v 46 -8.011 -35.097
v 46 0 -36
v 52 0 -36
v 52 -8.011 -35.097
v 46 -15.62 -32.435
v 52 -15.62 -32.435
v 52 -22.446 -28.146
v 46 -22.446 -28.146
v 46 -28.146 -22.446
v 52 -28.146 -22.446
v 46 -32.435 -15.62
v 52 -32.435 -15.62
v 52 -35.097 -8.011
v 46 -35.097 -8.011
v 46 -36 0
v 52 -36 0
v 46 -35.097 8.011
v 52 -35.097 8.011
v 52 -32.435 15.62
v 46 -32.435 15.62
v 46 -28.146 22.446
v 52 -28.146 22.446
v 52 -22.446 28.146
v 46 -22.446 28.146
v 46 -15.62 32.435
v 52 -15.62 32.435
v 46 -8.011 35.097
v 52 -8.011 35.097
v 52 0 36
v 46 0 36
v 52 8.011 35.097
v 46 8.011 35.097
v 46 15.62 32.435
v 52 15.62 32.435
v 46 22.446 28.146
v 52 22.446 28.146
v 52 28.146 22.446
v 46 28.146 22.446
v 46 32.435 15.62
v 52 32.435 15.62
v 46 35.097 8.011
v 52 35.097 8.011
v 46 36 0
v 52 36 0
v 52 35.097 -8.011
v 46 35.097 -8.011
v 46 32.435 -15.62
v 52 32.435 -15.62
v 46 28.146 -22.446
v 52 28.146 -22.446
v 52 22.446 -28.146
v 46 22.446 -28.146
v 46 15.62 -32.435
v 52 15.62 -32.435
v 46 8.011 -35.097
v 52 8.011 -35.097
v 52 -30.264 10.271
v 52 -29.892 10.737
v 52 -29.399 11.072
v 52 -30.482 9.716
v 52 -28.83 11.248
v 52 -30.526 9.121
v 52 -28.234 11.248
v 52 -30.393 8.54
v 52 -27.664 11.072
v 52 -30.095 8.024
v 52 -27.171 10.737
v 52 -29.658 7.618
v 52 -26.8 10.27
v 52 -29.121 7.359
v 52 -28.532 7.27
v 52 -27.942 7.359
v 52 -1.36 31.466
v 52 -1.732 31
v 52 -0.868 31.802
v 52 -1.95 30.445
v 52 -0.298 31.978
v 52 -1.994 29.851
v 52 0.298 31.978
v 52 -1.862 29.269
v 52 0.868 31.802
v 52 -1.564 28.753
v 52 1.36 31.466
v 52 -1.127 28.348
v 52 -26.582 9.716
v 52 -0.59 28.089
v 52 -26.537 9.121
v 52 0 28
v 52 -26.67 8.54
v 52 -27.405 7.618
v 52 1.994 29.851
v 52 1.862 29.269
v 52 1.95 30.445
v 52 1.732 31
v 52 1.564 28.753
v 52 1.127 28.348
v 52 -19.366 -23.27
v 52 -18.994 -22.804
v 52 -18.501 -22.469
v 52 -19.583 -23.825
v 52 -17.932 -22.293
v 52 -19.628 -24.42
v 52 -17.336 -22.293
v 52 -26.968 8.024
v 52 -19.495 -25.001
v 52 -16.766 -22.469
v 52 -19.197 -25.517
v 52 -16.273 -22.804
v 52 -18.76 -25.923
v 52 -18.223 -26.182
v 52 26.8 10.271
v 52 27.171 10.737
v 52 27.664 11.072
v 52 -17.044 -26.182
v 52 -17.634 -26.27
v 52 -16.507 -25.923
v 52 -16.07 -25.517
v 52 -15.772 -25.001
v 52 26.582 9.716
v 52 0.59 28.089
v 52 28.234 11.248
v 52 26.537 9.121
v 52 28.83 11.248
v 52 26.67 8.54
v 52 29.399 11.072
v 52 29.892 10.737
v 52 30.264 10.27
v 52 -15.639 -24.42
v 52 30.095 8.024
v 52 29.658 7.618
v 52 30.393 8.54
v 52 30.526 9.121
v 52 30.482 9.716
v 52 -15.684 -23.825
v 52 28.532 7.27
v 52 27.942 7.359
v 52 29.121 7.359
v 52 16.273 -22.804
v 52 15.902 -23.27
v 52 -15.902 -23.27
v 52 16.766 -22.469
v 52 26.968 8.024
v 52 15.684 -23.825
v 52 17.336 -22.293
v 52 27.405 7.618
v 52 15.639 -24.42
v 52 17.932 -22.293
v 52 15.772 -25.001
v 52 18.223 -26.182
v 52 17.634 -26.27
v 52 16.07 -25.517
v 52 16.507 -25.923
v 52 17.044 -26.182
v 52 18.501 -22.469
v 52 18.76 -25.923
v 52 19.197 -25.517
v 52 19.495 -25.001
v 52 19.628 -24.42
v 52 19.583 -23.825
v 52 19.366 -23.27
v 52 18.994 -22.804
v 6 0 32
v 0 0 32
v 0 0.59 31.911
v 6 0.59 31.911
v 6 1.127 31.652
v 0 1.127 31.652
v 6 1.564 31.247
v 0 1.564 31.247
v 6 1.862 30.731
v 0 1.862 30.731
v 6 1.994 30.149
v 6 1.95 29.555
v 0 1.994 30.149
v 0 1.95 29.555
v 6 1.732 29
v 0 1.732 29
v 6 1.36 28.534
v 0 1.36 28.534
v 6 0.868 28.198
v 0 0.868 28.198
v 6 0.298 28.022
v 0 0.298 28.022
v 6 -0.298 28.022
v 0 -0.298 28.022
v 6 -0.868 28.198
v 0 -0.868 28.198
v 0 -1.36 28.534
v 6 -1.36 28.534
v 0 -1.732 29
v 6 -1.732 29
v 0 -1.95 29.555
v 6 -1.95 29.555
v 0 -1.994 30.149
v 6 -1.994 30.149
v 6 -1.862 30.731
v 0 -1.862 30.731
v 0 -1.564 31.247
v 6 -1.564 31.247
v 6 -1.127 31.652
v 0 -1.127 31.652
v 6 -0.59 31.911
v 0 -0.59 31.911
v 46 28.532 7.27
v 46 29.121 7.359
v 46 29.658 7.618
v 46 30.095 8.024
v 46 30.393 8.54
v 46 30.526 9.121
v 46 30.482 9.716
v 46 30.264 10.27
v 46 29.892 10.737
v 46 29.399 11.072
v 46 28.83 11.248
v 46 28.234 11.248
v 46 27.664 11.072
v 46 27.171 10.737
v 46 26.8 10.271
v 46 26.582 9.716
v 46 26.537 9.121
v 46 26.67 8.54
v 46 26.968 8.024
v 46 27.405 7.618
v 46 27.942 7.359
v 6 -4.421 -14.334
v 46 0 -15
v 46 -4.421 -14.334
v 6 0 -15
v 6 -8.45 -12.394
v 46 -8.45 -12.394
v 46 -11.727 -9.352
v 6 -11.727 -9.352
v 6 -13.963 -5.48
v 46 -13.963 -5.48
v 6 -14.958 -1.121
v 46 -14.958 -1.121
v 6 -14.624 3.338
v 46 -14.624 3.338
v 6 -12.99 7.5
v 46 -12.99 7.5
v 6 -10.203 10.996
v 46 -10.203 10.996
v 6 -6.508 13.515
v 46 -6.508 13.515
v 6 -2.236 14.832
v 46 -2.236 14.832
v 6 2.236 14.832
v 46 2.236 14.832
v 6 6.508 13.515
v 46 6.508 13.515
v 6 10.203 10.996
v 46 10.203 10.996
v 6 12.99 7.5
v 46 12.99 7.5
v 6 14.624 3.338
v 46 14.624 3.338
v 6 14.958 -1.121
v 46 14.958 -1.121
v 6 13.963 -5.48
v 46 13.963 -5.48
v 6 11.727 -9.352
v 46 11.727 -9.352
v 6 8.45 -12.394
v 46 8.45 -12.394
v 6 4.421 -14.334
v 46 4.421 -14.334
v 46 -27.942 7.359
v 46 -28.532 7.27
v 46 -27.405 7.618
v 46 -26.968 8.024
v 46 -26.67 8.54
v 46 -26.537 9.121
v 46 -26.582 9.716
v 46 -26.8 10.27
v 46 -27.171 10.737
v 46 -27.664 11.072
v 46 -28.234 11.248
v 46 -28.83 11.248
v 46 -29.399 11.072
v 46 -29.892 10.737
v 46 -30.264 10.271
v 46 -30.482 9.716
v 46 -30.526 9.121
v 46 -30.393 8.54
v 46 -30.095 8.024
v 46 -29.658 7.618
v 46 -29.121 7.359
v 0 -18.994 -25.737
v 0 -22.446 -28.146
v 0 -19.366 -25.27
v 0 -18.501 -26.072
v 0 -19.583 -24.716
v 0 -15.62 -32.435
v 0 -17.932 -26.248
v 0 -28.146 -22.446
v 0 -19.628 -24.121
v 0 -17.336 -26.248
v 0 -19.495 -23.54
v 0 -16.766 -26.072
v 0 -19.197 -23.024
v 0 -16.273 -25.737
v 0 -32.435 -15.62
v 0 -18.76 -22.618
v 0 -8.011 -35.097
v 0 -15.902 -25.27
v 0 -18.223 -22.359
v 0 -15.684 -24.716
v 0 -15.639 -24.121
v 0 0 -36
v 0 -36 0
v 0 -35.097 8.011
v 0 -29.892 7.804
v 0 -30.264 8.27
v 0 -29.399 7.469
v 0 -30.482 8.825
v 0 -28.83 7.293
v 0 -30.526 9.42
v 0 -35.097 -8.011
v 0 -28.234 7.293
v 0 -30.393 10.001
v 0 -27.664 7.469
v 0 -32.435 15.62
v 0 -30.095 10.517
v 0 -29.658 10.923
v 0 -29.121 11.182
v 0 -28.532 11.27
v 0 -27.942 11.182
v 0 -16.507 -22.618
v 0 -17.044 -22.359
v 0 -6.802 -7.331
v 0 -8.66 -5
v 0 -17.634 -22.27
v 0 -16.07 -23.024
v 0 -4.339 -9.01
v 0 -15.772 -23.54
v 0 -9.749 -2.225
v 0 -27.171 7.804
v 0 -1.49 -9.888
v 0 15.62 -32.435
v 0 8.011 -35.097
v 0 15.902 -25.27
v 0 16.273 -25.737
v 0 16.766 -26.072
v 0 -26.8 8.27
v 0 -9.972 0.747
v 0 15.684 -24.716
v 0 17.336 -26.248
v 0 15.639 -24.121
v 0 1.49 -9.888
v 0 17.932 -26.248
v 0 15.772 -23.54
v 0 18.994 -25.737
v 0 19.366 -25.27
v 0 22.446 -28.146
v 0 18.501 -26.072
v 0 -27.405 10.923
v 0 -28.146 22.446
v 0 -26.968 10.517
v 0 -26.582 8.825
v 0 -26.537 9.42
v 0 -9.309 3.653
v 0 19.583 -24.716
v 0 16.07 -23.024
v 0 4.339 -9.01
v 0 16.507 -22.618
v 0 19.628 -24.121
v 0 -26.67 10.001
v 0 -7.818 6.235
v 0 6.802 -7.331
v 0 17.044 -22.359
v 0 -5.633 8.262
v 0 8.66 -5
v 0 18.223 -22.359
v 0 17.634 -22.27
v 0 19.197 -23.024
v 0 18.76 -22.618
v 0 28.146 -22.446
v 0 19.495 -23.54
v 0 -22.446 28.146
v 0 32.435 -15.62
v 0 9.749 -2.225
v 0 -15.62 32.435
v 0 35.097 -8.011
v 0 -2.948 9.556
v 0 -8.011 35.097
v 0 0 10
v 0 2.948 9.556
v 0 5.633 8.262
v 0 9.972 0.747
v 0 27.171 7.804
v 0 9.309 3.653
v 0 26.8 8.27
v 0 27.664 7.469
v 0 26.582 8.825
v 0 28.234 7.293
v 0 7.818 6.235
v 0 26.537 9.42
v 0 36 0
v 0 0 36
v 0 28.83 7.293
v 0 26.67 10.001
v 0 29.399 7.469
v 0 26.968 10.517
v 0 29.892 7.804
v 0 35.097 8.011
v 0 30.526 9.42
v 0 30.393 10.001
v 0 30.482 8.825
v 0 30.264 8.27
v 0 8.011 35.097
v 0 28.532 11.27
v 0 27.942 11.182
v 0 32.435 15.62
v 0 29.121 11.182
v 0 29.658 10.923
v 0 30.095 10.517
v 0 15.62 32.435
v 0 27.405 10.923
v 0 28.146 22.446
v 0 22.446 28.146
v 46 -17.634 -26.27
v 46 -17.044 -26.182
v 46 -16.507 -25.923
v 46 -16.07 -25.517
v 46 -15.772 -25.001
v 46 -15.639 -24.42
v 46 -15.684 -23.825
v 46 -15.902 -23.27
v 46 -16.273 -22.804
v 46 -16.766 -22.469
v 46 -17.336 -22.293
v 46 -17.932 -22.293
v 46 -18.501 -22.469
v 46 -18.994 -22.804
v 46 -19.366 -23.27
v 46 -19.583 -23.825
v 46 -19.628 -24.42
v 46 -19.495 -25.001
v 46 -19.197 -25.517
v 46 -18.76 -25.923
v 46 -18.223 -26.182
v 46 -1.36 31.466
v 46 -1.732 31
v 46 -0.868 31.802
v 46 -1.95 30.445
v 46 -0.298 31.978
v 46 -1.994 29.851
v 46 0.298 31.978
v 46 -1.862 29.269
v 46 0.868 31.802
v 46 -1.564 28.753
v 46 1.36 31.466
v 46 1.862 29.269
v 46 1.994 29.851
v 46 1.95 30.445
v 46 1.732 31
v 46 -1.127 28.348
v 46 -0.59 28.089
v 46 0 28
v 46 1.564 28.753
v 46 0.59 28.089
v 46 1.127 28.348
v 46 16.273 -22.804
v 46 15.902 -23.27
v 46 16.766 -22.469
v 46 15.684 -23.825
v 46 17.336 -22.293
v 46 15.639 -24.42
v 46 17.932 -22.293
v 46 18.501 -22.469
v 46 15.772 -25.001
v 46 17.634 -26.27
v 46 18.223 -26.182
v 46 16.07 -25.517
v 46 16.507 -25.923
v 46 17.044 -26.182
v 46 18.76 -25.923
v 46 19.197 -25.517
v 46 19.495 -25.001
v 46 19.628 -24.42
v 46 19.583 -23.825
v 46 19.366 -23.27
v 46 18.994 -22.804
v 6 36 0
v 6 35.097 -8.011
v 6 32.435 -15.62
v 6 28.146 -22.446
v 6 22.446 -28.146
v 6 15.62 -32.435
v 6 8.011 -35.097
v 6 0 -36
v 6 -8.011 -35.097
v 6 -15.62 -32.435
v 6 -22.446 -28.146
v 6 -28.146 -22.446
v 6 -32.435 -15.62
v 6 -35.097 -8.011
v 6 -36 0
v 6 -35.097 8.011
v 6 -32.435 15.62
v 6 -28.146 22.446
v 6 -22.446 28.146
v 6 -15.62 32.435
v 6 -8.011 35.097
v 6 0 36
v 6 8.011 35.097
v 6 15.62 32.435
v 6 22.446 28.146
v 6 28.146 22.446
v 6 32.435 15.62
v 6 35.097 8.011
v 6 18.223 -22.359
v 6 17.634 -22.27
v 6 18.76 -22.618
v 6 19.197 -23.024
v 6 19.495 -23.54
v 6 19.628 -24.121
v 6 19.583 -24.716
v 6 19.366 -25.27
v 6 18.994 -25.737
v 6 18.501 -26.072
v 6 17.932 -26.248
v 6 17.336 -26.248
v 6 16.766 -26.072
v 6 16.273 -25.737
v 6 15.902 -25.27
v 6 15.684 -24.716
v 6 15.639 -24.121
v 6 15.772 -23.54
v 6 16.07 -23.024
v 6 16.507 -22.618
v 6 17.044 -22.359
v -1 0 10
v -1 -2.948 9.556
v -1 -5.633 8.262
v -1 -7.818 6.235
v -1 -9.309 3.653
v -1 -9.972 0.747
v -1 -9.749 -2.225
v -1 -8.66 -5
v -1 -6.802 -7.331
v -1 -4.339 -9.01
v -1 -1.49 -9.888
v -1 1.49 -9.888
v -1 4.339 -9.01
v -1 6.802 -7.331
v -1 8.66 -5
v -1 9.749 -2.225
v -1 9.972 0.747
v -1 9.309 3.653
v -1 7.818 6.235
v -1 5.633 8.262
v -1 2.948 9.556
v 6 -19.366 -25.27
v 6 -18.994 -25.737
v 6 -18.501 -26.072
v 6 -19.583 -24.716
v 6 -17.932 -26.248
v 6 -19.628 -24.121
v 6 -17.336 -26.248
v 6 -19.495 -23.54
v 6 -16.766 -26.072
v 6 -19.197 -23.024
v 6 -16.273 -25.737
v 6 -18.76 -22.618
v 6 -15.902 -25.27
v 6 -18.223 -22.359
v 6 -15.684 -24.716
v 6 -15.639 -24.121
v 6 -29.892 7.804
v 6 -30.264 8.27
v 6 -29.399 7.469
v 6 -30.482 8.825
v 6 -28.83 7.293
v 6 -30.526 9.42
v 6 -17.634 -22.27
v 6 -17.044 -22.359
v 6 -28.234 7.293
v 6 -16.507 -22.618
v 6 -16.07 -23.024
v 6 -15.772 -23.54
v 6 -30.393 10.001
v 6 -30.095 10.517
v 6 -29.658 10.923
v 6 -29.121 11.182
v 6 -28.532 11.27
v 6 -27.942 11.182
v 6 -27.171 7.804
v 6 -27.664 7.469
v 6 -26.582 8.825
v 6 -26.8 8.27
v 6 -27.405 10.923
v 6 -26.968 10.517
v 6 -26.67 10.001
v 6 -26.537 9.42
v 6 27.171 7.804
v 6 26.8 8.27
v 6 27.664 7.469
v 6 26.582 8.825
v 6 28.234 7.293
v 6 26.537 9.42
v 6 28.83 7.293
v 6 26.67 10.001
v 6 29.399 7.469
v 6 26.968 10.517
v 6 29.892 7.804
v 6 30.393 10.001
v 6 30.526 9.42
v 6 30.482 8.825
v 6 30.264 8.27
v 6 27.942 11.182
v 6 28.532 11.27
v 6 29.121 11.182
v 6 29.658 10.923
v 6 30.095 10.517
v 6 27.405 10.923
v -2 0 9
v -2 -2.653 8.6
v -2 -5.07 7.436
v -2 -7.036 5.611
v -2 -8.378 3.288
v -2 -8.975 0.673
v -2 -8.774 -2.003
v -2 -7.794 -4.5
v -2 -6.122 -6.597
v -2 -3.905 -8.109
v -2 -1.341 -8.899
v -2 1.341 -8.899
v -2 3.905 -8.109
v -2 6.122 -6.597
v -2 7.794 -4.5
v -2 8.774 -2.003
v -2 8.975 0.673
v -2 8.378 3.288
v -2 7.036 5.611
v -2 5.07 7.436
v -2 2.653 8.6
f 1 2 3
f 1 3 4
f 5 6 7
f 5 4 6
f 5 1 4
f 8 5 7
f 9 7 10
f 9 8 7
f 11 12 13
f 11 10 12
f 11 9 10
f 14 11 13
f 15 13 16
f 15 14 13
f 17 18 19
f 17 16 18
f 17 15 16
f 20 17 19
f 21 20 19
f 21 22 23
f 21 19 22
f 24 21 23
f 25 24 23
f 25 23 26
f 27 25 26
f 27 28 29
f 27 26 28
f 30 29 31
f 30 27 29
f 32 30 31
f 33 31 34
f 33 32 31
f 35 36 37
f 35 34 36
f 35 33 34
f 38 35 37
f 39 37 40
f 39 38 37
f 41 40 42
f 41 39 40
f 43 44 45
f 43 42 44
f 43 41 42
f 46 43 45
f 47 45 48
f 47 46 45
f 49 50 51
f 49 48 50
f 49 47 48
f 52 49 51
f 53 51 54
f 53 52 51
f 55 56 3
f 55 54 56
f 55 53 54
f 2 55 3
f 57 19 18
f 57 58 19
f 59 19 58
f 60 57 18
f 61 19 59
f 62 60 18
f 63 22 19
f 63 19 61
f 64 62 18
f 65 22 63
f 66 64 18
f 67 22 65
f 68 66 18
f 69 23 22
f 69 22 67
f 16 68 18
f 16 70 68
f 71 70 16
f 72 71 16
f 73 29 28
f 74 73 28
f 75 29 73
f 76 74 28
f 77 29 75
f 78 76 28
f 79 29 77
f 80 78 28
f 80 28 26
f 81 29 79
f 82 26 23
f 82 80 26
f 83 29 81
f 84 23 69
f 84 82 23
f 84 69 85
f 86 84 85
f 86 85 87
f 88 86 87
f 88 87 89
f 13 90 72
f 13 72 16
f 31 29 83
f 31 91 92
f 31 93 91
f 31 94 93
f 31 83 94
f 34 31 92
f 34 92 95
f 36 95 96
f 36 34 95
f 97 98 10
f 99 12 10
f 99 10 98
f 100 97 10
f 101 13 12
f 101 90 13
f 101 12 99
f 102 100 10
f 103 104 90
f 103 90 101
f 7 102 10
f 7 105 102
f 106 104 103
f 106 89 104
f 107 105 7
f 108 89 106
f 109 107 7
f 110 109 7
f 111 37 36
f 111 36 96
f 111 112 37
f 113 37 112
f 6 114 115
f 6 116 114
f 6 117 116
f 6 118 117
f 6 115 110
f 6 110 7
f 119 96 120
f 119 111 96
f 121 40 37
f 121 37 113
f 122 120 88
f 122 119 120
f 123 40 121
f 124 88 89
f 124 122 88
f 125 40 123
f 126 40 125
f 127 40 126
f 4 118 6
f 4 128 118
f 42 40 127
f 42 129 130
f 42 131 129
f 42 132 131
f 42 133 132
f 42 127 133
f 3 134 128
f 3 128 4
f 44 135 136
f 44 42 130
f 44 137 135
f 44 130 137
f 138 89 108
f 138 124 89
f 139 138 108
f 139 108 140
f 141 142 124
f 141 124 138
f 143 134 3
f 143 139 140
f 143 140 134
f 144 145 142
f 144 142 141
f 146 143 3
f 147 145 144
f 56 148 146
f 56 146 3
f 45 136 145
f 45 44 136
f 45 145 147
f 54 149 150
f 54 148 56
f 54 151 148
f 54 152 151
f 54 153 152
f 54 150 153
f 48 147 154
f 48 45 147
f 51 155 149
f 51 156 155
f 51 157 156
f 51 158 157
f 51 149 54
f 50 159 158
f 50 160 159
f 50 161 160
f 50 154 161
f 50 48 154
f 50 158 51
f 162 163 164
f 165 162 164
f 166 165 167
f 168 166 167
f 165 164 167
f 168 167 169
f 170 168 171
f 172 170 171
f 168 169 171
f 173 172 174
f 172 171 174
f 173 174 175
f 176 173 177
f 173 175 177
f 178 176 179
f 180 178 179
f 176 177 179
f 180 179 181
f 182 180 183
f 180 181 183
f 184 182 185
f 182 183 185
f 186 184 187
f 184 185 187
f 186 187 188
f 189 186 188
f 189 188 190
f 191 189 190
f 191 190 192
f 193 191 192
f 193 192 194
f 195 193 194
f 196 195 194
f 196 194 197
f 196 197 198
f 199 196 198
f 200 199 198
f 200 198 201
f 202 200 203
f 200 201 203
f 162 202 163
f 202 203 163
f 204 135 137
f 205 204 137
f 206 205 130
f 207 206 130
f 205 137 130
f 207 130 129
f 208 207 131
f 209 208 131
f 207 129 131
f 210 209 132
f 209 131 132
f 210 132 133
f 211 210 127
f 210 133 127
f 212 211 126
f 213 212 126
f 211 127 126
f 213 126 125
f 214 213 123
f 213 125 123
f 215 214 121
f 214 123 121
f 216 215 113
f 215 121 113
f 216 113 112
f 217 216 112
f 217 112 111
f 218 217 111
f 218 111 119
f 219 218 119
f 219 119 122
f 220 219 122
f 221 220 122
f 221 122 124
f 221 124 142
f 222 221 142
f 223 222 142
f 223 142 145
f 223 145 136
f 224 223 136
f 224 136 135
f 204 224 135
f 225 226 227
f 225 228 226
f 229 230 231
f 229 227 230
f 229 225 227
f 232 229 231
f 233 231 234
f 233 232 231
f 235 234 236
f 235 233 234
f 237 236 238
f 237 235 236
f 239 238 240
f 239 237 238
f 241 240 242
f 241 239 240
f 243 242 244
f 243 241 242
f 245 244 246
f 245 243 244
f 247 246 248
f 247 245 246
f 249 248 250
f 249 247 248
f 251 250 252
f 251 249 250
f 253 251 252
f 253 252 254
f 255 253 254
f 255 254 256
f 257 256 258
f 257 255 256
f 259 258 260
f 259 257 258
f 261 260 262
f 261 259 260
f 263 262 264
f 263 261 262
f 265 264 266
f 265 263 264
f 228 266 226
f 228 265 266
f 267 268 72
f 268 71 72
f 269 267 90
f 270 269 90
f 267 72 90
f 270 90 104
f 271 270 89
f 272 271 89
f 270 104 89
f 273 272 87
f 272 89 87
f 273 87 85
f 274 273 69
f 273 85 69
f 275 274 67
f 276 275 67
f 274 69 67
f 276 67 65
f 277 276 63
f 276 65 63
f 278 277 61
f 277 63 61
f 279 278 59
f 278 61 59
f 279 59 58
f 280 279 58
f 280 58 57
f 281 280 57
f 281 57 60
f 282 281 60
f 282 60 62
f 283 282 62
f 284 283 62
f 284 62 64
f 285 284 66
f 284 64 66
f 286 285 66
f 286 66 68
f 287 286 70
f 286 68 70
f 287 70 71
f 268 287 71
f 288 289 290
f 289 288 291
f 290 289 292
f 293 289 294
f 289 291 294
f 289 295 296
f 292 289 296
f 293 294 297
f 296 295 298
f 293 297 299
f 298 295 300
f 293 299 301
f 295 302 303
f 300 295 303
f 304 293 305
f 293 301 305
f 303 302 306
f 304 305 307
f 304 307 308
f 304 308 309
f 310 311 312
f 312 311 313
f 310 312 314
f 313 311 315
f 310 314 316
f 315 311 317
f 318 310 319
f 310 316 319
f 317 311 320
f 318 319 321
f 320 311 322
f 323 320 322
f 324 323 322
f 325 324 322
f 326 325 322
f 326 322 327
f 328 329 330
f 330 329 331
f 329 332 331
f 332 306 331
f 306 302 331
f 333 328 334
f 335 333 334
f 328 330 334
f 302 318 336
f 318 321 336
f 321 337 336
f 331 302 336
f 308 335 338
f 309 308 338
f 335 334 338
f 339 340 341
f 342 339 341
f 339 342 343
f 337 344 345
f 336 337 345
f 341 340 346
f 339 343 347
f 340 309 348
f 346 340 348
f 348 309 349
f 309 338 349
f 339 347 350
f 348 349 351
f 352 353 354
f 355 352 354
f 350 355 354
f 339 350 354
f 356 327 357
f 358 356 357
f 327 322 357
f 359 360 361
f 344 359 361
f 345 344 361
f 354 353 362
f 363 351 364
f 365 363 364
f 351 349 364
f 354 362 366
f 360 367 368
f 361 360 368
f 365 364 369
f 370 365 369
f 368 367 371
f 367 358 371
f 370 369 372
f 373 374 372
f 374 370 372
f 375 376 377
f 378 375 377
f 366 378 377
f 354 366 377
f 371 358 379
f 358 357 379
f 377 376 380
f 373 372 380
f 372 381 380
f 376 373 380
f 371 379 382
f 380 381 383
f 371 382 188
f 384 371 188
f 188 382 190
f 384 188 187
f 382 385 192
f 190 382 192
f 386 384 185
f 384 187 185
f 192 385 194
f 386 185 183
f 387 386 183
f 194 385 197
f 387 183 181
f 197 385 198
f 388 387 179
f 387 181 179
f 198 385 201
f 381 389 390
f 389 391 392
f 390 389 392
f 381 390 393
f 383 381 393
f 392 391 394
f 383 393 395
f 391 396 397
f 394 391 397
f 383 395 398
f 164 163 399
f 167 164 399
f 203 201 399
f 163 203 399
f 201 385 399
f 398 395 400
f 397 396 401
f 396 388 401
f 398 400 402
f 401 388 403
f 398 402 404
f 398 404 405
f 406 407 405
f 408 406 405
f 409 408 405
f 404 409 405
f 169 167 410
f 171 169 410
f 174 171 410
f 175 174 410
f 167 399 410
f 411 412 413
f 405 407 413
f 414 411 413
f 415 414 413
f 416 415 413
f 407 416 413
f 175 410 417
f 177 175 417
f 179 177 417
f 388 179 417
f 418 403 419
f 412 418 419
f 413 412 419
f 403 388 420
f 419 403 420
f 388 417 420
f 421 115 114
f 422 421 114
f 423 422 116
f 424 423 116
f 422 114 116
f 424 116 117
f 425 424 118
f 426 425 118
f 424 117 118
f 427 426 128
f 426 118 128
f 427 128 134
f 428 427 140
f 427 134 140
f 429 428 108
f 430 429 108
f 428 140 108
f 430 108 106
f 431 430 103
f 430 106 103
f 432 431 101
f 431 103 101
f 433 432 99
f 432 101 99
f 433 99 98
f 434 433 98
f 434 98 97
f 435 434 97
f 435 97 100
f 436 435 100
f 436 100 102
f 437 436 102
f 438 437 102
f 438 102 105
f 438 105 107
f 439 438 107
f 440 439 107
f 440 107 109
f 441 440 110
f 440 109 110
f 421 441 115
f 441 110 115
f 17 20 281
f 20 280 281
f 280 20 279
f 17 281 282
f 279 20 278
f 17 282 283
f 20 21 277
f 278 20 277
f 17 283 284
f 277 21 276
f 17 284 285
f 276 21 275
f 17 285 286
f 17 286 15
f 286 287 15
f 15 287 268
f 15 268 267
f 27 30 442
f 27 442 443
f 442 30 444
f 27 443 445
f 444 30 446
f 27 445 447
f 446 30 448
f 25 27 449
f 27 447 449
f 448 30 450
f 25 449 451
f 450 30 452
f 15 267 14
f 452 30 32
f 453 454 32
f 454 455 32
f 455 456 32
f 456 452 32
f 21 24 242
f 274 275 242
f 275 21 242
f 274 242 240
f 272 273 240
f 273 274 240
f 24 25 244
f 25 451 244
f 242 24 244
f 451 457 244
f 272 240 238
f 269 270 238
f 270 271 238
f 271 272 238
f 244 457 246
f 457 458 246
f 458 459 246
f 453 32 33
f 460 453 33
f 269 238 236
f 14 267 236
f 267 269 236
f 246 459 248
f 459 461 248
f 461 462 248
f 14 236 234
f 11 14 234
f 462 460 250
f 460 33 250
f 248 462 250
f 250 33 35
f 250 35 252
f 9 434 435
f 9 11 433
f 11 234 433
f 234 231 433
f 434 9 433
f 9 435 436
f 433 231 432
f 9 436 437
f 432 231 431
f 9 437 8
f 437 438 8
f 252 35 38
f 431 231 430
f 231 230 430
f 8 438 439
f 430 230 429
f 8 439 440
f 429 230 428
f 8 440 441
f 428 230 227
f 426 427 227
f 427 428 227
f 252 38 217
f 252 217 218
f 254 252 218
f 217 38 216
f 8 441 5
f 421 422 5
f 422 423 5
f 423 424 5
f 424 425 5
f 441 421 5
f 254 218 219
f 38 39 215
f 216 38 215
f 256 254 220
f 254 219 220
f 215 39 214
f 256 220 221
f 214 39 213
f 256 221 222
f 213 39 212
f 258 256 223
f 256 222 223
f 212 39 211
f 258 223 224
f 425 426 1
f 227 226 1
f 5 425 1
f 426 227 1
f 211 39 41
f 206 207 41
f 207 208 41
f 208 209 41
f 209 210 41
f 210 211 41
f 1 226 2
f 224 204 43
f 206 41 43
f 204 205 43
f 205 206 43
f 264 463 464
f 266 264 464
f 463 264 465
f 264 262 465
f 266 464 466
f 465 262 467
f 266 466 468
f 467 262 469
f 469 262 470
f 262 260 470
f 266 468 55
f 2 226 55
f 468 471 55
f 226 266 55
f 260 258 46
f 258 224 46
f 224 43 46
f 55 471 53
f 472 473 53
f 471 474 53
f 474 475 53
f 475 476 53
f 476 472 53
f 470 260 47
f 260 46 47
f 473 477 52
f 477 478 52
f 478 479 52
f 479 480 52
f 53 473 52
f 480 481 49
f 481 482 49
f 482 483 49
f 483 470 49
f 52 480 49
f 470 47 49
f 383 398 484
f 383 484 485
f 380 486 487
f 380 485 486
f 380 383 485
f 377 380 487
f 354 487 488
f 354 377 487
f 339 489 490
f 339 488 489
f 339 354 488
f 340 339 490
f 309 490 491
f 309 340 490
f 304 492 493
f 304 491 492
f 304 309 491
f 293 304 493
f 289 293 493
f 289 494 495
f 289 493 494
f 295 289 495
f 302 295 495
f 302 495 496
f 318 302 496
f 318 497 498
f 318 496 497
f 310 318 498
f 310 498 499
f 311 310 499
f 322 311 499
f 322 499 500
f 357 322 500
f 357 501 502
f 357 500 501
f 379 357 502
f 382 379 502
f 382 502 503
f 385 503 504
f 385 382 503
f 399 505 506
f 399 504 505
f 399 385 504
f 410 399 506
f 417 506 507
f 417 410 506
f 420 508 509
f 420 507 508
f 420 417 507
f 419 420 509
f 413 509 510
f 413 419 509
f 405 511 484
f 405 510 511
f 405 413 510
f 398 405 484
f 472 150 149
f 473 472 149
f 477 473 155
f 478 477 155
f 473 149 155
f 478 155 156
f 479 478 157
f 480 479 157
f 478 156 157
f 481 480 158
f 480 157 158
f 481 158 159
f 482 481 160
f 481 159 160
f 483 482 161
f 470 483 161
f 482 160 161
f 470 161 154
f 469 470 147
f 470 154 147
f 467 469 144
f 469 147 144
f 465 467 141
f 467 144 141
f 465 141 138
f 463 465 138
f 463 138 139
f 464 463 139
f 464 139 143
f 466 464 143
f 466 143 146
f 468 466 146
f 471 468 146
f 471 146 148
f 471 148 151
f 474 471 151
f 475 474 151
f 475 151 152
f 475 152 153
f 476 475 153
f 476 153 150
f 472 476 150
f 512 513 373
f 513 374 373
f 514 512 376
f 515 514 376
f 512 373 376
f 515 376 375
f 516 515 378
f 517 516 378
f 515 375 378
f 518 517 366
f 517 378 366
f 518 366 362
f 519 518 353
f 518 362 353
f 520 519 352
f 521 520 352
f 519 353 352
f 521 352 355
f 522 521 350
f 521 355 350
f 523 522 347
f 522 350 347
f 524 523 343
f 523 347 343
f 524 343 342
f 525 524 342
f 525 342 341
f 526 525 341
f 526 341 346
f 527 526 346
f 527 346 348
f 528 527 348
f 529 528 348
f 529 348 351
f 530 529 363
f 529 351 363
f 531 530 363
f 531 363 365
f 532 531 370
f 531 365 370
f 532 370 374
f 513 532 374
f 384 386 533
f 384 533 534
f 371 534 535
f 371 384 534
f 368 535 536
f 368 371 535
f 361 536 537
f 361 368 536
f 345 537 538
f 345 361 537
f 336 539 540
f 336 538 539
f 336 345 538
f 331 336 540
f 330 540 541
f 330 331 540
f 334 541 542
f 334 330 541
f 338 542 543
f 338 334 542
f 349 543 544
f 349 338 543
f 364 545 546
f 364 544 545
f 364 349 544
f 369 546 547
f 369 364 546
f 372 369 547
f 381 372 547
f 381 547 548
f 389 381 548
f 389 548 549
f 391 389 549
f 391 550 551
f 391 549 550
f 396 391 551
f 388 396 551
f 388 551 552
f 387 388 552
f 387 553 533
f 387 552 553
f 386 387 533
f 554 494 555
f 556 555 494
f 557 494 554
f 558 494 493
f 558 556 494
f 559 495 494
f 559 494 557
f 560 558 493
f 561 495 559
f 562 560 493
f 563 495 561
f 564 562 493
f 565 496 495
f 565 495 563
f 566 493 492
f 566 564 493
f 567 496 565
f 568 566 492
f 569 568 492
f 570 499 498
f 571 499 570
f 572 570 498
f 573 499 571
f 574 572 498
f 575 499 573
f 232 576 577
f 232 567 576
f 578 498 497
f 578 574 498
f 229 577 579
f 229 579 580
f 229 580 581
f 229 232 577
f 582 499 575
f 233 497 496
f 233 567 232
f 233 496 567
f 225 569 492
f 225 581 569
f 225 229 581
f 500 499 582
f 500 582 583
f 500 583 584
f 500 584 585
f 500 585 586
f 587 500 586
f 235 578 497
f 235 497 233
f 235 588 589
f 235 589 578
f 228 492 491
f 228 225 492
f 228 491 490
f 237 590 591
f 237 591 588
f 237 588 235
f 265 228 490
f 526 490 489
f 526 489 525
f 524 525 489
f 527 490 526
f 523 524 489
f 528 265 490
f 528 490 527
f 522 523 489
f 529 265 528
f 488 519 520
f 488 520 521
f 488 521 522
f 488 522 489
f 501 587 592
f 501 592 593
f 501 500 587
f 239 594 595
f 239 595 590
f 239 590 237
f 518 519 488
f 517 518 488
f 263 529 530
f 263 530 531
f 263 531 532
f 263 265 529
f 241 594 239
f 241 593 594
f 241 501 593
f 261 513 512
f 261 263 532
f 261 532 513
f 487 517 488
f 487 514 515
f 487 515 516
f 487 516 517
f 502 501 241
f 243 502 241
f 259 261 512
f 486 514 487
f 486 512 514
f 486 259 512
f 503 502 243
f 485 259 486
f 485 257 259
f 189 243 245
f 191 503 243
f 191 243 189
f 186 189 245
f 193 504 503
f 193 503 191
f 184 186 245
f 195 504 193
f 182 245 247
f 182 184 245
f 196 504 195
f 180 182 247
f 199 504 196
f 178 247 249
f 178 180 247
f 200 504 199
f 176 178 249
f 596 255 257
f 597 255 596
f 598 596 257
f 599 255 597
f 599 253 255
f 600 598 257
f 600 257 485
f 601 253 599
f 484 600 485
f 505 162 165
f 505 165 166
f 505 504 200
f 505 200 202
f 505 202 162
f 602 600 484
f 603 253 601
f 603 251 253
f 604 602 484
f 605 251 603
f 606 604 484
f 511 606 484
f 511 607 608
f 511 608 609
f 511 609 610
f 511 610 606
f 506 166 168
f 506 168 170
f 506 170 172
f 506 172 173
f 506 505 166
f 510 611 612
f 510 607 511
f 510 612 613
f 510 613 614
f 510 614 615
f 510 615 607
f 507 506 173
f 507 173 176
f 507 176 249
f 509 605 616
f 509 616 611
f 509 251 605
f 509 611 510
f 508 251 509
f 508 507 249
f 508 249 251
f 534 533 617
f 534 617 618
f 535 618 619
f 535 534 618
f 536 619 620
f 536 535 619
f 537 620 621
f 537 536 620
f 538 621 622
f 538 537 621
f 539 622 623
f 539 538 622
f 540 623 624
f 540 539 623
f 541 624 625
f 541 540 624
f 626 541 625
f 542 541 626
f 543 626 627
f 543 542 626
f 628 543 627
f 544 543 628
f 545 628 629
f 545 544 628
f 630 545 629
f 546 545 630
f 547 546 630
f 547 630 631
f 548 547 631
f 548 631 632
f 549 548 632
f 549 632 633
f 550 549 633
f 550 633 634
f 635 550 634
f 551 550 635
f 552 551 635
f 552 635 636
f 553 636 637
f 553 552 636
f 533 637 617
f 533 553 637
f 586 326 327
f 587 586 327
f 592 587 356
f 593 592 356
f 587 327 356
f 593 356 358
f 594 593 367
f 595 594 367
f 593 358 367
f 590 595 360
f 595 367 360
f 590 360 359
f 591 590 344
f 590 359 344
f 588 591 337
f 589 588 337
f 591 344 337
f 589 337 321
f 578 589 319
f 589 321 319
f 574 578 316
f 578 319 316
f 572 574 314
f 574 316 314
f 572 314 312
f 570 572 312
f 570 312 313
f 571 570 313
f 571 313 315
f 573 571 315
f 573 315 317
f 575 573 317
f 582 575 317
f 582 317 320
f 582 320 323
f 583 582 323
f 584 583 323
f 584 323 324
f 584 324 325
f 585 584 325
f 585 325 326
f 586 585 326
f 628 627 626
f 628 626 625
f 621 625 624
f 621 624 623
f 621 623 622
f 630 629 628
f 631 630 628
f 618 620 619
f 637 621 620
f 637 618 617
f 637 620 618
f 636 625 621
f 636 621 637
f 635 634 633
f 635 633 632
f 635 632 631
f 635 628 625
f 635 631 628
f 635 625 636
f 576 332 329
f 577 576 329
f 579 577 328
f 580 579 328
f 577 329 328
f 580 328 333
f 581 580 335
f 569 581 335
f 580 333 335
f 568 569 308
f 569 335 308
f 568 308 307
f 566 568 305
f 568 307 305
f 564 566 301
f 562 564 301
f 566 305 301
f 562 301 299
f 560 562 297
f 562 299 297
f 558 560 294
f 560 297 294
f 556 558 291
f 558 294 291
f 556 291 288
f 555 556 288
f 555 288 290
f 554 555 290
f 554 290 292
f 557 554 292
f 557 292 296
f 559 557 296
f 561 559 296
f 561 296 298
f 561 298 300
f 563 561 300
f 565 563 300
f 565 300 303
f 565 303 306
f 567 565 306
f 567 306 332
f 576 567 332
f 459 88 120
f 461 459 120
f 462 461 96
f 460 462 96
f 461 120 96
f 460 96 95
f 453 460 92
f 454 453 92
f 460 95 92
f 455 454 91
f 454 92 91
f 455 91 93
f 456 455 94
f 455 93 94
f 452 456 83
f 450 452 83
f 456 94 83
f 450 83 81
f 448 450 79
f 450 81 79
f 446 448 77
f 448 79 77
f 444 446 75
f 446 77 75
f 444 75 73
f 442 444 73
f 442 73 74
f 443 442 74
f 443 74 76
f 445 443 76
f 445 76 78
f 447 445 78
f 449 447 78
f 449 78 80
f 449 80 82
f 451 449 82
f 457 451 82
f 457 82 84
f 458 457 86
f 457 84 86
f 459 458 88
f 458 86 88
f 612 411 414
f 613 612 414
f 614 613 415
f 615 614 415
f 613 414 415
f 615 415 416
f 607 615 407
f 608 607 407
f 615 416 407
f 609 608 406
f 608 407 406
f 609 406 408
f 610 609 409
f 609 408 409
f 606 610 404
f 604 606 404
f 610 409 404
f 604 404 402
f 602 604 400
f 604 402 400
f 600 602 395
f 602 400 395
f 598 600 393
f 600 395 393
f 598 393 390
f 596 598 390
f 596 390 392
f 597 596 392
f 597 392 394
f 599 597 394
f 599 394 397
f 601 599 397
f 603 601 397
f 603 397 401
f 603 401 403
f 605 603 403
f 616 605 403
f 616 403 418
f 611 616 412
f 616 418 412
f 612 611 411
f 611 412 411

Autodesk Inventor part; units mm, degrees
ref_plane "YZ Plane" through (0, 0, 0) normal (1, 0, 0) x (0, 1, 0)
ref_plane "XZ Plane" through (0, 0, 0) normal (0, 1, 0) x (-1, 0, 0)
ref_plane "XY Plane" through (0, 0, 0) normal (0, 0, 1) x (1, 0, 0)
sketch "スケッチ1" plane through (0, 0, 0) normal (1, 0, 0) x (0, 1, 0)
  circle A0 centre (0, 0) radius 36
  dimension "d0" = 72
extrude "押し出し1" add sketch "スケッチ1" along normal blind 6
sketch "スケッチ2" plane through (6, 0, 0) normal (1, 0, 0) x (0, 0, -1)
  circle A0 centre (0, 0) radius 15
  dimension "d3" = 30
extrude "押し出し2" add sketch "スケッチ2" along normal blind 40
sketch "スケッチ3" plane through (46, 0, 0) normal (1, 0, 0) x (0, 0, -1)
  circle A0 centre (0, 0) radius 36
  dimension "d6" = 72
extrude "押し出し3" add sketch "スケッチ3" along normal blind 6
sketch "スケッチ4" plane through (0, 0, 0) normal (-1, 0, 0) x (0, 0, 1)
  circle A0 centre (30, 0) radius 2
  circle A1 centre (9.2705, 28.5317) radius 2
  circle A2 centre (-24.2705, 17.6336) radius 2
  circle A3 centre (-24.2705, -17.6336) radius 2
  circle A4 centre (9.2705, -28.5317) radius 2
  circle A5 centre (0, 0) radius 10
  dimension "d9" = 30
  dimension "d10" = 4
  dimension "d13" = 360
  dimension "d17" = 20
extrude "押し出し4" cut sketch "スケッチ4" against normal blind 6 contours A0 | A1 | A2 | A3 | A4
extrude "押し出し5" add sketch "スケッチ4" along normal blind 2 contours A5
chamfer "面取り1" distance 1 angle 45 1 edges at (-2, 0, -10)
sketch "スケッチ6" plane through (52, 0, 0) normal (1, 0, 0) x (0, 0, -1)
  circle A0 centre (24.2705, 17.6336) radius 2 projected
  circle A1 centre (24.2705, 17.6336) radius 2 projected
  circle A2 centre (-9.2705, 28.5317) radius 2 projected
  circle A3 centre (-9.2705, 28.5317) radius 2 projected
  circle A4 centre (-30, 0) radius 2 projected
  circle A5 centre (24.2705, -17.6336) radius 2 projected
  circle A6 centre (24.2705, -17.6336) radius 2 projected
  circle A7 centre (-9.2705, -28.5317) radius 2 projected
  circle A8 centre (-9.2705, -28.5317) radius 2 projected
  point P0 (0, 0)
extrude "押し出し6" cut sketch "スケッチ6" against normal blind 6
properties part number "tool_1" material "アルミニウム 6061"
